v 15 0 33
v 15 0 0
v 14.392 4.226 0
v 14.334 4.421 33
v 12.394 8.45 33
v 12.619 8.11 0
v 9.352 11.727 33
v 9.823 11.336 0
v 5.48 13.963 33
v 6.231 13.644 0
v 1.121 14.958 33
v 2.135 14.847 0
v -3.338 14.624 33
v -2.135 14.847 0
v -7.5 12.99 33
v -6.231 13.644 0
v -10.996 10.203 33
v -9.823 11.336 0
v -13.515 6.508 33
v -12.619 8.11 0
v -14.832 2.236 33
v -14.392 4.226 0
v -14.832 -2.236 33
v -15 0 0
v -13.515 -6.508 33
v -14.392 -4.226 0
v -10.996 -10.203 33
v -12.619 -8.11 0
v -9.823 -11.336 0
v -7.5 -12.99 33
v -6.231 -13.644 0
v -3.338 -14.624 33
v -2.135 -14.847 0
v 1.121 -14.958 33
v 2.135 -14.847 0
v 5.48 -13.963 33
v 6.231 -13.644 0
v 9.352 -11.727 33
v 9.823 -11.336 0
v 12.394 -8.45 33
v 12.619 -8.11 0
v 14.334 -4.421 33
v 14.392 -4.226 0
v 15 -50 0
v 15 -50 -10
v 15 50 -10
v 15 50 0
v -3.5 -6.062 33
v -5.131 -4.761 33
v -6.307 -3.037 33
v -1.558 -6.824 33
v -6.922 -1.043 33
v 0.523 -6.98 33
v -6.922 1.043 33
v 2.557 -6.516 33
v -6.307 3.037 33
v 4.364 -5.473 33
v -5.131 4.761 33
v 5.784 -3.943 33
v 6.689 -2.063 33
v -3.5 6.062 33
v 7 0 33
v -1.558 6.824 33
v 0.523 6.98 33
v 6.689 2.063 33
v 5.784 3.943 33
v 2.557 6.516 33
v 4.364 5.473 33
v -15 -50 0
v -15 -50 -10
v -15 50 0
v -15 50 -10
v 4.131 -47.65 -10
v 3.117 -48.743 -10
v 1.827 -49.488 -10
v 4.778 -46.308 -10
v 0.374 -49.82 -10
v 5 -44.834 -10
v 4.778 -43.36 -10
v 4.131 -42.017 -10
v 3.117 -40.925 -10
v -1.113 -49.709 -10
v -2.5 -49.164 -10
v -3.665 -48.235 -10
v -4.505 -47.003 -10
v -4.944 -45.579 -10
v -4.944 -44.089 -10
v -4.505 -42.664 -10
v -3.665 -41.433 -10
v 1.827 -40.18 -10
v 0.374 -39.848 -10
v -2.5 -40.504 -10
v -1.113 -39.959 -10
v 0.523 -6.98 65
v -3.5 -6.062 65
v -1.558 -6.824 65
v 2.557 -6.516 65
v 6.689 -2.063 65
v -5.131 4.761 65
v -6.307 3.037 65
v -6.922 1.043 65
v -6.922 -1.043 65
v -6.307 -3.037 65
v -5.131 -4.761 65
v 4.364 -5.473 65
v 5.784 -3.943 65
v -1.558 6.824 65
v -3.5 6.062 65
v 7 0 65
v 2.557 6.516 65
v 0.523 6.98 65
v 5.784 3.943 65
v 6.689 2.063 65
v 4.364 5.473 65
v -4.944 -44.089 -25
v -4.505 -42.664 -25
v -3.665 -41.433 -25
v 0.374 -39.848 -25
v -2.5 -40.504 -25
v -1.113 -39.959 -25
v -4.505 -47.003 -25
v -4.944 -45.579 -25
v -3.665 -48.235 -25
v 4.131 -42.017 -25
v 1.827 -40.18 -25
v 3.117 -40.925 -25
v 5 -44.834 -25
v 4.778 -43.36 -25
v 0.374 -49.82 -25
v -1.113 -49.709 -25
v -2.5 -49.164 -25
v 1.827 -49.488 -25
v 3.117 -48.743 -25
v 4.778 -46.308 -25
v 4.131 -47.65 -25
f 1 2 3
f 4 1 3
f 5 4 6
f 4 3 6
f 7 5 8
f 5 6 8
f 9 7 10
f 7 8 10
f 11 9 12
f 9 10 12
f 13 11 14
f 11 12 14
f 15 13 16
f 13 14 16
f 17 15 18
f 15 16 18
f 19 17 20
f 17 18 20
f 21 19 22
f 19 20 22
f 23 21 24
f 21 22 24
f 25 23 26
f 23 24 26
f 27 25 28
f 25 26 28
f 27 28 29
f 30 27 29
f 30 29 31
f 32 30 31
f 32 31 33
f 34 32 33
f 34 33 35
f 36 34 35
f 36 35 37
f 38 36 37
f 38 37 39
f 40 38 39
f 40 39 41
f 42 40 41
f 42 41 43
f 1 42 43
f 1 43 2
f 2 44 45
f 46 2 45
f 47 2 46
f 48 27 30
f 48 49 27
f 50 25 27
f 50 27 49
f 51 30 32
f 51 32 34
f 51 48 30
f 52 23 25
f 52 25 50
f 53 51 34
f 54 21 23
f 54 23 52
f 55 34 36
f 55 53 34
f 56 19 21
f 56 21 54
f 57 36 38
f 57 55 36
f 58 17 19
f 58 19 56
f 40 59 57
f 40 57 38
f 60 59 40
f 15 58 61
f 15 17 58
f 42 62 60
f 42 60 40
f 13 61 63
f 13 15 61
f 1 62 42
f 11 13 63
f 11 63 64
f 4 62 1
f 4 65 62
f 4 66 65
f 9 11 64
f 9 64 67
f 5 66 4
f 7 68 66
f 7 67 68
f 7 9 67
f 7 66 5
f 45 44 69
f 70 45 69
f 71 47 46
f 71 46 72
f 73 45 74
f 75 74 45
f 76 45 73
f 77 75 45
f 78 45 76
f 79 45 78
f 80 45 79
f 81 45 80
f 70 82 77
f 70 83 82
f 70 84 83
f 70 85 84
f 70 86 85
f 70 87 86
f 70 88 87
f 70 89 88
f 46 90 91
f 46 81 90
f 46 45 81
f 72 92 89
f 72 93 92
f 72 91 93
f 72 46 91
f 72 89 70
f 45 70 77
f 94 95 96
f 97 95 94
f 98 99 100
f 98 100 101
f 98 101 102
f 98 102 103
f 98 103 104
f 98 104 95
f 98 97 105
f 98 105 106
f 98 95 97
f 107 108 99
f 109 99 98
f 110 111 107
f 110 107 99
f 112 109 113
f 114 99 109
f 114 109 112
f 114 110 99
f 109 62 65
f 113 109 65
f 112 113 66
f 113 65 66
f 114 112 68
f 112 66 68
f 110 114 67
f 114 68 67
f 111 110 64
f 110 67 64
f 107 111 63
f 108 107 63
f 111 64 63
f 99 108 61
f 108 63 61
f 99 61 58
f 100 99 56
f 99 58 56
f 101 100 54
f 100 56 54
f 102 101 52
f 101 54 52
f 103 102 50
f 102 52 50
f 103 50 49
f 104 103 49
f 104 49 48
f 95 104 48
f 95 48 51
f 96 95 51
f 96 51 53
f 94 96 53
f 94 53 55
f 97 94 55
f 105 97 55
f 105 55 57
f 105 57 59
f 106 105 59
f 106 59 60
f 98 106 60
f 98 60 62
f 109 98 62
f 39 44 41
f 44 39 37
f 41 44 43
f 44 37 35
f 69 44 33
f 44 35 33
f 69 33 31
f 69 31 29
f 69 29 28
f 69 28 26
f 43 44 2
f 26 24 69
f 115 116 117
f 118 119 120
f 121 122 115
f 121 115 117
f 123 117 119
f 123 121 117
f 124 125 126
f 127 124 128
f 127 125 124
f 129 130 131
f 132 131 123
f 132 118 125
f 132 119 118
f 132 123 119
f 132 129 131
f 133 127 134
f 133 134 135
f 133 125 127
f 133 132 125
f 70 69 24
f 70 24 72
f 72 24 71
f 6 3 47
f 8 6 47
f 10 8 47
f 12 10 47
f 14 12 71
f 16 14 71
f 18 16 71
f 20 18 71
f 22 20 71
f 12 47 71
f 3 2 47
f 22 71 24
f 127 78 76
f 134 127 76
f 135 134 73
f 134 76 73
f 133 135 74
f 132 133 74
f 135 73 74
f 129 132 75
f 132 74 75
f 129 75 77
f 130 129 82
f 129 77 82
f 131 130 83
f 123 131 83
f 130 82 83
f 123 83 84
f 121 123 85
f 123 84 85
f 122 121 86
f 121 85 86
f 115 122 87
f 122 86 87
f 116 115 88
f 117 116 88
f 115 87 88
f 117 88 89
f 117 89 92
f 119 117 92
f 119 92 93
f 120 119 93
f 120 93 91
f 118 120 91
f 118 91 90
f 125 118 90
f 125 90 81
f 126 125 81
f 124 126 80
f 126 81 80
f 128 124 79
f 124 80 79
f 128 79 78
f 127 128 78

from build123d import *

# Parameters (mm, degrees)
SKETCH1_R           = 7
BOSS_EXTRUDE1_DEPTH = 65
SKETCH1_3_R         = 15
SKETCH1_3_R_2       = 7
BOSS_EXTRUDE2_DEPTH = 33
SKETCH3_W           = 30
SKETCH3_H           = 100
BOSS_EXTRUDE4_DEPTH = 10
SKETCH4_R           = 5
BOSS_EXTRUDE5_DEPTH = 15


with BuildPart() as part:
    # Sketch1 → Boss-Extrude1 (new body)
    with BuildSketch(Plane.XY):
        Circle(SKETCH1_R)
    extrude(amount=BOSS_EXTRUDE1_DEPTH)

    # Sketch1<3> → Boss-Extrude2 (add)
    with BuildSketch(Plane.XY):
        Circle(SKETCH1_3_R)
        Circle(SKETCH1_3_R_2, mode=Mode.SUBTRACT)
    extrude(amount=BOSS_EXTRUDE2_DEPTH)

    # Sketch3 → Boss-Extrude4 (add)
    with BuildSketch(Plane(origin=(0, 0, 0), x_dir=(-1, 0, 0), z_dir=(0, 0, -1))):
        Rectangle(SKETCH3_W, SKETCH3_H)
    extrude(amount=BOSS_EXTRUDE4_DEPTH)

    # Sketch4 → Boss-Extrude5 (add)
    with BuildSketch(Plane(origin=(0, 0, -10), x_dir=(-1, 0, 0), z_dir=(0, 0, -1))):
        with Locations((0, -44.833870937)):
            Circle(SKETCH4_R)
    extrude(amount=BOSS_EXTRUDE5_DEPTH)


solid = part.part
